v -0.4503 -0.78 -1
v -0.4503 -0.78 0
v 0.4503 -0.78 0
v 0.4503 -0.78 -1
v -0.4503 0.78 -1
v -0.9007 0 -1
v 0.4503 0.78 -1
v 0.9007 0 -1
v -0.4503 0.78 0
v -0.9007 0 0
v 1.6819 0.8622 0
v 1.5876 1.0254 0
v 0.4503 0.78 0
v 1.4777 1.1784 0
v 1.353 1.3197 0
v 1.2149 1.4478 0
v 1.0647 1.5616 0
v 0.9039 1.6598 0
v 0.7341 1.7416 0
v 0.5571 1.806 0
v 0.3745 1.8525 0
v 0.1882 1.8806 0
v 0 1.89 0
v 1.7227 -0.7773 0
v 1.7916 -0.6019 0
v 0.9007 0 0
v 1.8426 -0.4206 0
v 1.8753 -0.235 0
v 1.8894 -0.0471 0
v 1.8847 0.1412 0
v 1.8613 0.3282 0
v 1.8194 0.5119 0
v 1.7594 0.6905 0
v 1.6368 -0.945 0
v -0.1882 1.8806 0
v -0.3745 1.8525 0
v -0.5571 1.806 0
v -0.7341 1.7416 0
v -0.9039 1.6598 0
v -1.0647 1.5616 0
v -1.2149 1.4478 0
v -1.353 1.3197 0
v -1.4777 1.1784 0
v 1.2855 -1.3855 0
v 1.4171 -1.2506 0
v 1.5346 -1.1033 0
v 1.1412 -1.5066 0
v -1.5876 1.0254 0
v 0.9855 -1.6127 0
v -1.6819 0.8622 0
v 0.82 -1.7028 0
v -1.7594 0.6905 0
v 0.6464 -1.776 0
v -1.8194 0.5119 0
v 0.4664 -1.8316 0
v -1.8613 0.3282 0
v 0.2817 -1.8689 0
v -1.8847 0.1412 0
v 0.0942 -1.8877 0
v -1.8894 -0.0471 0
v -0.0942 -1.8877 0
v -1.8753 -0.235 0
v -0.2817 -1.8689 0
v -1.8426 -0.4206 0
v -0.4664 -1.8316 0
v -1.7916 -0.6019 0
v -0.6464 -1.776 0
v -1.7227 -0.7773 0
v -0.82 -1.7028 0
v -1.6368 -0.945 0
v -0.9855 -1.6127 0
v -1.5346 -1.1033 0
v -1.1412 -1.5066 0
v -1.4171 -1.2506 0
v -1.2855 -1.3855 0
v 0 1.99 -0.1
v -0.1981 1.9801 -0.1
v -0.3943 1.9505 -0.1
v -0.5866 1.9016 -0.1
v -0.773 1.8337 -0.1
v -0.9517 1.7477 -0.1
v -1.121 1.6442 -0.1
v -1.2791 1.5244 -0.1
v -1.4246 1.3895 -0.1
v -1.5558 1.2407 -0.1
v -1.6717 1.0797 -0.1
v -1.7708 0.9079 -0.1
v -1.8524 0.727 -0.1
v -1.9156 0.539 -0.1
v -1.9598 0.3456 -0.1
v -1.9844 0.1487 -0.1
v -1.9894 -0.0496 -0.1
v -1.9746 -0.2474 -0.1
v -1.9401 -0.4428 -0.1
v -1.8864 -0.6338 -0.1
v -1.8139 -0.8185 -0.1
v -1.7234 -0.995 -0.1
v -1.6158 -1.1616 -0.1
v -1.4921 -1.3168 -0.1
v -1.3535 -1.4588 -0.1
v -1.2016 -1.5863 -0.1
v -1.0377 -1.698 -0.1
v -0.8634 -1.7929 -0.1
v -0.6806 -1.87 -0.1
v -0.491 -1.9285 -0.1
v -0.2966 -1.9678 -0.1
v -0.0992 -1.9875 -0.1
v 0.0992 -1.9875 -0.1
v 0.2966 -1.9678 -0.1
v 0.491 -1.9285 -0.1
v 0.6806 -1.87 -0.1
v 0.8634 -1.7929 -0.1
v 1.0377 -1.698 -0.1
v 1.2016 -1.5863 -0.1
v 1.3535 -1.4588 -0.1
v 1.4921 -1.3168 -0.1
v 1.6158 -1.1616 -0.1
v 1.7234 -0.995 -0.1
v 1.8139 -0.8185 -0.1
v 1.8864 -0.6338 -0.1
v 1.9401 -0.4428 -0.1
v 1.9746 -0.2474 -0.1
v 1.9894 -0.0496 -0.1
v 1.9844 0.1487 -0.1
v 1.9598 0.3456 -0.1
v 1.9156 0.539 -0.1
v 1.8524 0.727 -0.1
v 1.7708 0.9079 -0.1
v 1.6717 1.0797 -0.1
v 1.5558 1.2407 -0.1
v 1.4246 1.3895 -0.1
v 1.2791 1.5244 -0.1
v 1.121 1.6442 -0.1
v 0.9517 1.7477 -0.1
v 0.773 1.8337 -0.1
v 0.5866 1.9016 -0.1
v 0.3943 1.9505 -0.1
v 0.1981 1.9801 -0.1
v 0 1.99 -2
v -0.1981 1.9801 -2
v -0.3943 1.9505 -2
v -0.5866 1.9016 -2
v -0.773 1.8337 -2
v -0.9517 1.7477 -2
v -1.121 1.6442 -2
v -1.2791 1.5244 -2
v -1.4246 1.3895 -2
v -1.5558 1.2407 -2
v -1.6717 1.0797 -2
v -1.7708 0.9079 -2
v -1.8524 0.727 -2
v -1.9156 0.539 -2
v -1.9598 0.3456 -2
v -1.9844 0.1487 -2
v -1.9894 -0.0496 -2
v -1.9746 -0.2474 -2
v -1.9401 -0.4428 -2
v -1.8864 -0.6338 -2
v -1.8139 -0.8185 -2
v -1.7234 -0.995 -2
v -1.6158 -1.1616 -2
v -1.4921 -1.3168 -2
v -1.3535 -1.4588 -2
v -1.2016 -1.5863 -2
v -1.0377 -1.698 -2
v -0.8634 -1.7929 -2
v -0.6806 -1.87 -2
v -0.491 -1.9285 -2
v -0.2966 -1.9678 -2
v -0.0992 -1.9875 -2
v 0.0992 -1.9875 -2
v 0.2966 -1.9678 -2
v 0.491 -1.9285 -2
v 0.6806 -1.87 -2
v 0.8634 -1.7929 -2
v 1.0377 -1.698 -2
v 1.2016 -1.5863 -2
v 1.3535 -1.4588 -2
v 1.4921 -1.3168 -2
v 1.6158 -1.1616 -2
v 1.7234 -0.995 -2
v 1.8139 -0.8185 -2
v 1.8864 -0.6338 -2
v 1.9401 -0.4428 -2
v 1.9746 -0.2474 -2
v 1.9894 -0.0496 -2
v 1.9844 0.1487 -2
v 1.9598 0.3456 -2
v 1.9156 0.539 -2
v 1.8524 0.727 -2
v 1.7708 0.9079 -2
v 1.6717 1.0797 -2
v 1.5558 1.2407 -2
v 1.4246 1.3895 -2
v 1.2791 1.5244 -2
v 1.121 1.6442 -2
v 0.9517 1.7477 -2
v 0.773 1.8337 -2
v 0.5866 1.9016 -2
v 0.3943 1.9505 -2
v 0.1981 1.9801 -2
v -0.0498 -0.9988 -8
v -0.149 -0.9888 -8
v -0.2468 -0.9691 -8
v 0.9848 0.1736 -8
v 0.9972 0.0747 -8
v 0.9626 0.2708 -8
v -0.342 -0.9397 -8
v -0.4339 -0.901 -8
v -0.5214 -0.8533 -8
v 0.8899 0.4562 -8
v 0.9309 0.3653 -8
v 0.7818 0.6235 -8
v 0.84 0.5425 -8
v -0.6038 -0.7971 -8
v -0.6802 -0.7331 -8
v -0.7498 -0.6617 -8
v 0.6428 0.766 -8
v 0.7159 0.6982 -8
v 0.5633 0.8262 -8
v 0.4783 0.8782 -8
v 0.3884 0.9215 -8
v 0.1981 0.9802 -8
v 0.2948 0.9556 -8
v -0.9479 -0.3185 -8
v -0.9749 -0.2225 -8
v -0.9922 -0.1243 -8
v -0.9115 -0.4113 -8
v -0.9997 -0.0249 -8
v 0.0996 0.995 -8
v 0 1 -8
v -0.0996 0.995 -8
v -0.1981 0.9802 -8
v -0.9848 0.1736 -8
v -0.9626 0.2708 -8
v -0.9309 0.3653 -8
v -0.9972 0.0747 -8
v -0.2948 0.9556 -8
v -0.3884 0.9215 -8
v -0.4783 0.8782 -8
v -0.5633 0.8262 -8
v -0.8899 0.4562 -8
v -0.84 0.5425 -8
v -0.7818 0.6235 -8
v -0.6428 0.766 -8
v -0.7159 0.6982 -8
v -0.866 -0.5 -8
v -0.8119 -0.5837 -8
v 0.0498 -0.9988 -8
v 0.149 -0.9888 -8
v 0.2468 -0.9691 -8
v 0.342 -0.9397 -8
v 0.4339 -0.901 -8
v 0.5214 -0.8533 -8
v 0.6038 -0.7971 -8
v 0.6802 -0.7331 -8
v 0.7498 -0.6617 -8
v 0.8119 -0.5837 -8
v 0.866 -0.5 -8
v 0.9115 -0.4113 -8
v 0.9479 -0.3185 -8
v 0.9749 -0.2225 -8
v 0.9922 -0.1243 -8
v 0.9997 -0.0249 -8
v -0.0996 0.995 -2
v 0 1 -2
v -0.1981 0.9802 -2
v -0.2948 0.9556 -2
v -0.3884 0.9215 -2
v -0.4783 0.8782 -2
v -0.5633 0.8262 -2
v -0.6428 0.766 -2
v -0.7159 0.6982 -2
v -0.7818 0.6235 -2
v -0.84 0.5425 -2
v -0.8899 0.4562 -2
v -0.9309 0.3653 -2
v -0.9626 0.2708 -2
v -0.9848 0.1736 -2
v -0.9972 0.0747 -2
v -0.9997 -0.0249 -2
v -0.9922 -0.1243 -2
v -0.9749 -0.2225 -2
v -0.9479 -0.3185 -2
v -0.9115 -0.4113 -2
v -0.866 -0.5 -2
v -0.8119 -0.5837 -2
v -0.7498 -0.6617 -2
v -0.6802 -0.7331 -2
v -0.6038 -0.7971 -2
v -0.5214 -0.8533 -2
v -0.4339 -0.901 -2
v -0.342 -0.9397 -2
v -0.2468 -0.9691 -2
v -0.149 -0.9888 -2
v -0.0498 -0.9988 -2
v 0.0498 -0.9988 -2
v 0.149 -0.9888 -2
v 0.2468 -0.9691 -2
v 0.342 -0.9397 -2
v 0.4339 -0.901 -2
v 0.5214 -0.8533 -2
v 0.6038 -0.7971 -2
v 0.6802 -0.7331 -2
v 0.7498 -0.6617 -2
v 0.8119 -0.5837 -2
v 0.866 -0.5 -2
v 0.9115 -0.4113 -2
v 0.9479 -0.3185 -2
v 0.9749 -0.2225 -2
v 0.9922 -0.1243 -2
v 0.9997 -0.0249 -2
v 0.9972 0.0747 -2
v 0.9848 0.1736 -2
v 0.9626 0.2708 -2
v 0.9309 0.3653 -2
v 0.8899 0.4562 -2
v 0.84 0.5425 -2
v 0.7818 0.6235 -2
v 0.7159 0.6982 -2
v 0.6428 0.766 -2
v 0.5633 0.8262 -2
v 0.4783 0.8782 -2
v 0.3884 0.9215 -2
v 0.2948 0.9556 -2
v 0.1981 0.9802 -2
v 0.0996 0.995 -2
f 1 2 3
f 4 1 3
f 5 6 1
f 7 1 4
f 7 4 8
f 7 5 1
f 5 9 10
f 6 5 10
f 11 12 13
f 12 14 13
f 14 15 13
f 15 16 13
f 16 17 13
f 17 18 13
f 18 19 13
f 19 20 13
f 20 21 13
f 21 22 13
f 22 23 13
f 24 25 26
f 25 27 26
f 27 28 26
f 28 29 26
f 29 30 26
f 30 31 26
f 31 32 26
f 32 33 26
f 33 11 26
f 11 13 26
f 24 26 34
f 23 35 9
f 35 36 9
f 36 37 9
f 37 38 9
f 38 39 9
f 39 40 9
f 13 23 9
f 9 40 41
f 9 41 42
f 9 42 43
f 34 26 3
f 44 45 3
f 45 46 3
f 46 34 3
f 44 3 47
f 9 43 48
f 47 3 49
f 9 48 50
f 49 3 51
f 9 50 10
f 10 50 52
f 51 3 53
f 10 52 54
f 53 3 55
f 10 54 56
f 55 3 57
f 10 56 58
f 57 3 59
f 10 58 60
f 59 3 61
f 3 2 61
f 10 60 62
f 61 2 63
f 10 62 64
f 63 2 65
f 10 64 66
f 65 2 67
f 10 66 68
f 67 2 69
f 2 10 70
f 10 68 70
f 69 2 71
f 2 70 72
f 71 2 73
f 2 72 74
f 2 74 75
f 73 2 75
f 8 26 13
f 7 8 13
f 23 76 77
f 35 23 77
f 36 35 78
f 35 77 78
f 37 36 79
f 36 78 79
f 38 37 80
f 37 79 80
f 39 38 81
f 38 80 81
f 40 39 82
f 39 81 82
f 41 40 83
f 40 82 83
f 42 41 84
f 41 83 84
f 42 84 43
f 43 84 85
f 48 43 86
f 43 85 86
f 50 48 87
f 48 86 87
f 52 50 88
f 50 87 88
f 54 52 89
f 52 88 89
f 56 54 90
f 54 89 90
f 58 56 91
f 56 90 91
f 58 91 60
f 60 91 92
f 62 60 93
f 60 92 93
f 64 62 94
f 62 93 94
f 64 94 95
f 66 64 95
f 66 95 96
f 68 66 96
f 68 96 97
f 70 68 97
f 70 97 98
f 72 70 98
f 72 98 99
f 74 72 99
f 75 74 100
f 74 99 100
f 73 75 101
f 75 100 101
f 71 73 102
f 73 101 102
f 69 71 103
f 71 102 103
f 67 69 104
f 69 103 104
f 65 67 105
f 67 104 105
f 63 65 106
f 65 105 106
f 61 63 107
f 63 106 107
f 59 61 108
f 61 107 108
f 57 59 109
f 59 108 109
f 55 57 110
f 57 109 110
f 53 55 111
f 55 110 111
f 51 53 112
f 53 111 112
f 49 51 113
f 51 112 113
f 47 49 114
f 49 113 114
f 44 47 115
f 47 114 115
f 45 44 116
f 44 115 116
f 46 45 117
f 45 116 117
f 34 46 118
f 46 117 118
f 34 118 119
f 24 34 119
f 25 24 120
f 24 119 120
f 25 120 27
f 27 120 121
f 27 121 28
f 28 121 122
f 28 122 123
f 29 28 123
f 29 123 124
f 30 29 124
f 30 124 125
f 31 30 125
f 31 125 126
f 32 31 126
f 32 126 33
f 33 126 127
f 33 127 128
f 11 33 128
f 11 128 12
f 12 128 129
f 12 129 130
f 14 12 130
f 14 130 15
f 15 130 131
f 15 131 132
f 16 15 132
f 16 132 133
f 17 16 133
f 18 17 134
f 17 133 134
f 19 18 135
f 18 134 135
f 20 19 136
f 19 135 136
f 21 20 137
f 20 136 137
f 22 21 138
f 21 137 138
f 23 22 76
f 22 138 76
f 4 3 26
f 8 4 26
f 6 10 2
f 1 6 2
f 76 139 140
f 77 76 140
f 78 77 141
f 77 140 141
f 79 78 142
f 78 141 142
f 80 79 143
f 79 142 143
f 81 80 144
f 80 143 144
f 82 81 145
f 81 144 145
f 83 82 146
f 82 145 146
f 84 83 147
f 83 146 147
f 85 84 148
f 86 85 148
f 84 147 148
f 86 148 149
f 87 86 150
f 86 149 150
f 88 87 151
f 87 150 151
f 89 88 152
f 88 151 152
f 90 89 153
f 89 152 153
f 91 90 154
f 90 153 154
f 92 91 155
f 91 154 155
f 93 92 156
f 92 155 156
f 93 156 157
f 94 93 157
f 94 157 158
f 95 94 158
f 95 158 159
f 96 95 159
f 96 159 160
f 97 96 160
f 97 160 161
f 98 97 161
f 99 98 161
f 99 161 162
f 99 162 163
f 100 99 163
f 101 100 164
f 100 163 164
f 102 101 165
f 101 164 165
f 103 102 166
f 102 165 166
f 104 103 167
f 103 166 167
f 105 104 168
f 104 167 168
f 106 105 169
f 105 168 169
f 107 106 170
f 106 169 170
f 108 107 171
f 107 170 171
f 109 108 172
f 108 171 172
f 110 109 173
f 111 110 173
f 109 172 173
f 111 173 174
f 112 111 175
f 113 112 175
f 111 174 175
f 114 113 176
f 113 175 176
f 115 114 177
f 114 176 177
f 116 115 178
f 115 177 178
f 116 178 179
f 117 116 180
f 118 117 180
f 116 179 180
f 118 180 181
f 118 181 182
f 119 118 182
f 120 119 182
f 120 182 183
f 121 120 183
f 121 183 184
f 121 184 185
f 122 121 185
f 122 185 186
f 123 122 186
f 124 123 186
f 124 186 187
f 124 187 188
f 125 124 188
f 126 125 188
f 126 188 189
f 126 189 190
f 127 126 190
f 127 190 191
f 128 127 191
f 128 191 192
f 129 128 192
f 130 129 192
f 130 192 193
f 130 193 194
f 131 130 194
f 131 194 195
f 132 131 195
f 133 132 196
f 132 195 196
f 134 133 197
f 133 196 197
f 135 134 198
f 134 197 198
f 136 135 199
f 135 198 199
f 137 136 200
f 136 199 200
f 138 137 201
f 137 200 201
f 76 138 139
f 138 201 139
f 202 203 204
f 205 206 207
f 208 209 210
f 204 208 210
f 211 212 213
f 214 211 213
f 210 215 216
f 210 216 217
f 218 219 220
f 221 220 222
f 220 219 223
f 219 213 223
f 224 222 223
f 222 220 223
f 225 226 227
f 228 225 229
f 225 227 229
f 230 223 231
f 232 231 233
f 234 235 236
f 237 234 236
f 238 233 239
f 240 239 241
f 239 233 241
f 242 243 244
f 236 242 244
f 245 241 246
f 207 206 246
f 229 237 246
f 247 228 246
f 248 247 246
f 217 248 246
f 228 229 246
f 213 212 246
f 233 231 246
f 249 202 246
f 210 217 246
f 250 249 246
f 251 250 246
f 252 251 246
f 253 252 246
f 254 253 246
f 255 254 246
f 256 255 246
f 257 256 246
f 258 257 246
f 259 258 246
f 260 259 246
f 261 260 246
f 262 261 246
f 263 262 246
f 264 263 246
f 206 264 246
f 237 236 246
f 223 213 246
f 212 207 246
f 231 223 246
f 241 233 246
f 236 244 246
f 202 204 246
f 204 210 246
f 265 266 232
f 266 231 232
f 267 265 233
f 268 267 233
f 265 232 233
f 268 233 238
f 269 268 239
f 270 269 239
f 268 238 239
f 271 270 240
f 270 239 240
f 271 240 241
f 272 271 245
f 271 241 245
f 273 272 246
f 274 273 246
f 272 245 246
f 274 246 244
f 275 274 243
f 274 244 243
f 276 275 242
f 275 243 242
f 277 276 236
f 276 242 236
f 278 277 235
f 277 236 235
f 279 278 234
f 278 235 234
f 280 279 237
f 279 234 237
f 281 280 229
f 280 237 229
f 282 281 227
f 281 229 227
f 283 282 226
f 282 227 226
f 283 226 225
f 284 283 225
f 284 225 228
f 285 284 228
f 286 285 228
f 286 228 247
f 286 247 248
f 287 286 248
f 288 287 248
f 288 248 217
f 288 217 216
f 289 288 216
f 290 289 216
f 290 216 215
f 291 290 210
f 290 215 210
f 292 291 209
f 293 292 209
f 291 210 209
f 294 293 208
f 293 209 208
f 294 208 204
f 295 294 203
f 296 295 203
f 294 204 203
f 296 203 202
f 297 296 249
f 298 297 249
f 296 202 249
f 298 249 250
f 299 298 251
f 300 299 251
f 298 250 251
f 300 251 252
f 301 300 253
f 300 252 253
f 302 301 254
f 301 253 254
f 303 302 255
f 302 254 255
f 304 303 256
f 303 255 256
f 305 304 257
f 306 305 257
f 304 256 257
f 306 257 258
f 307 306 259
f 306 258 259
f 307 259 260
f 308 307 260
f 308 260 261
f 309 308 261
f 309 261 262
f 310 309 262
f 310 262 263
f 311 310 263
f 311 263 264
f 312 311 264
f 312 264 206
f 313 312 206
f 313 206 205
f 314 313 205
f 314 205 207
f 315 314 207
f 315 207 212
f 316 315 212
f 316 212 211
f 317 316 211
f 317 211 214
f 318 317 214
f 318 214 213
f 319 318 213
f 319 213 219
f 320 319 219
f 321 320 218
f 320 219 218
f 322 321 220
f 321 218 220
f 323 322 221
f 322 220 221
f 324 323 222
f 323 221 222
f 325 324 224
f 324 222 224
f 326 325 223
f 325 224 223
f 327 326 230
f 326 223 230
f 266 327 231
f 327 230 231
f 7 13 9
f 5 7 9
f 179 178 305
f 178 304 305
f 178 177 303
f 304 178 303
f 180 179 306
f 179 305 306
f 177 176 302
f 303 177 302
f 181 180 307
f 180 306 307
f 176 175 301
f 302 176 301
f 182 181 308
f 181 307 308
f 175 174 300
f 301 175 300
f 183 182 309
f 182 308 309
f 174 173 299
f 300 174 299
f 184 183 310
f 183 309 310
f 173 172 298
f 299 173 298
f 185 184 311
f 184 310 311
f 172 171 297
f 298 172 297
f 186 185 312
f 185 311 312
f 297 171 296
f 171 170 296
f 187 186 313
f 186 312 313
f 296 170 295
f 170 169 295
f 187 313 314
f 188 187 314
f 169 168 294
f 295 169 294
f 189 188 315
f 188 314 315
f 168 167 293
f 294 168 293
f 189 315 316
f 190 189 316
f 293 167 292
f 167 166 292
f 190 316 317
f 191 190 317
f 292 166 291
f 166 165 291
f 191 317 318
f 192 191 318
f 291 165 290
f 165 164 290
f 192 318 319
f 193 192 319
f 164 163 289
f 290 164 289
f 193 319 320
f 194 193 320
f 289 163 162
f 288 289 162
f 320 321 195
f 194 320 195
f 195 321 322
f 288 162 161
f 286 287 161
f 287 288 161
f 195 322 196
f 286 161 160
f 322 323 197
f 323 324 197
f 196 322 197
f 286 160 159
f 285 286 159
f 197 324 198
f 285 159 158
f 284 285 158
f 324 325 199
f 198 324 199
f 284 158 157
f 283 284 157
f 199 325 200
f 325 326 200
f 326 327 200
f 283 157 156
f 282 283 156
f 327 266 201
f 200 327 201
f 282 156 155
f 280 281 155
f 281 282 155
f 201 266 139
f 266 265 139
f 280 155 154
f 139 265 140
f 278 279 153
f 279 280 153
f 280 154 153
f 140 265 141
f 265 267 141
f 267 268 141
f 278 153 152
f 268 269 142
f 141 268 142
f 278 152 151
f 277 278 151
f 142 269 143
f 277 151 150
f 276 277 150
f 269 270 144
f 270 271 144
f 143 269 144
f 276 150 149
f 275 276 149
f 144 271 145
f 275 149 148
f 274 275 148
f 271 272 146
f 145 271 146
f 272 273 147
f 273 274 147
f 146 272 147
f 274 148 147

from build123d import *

# Parameters (mm, degrees)
CUT_EXTRUDE_1_DEPTH = 1
CHAMFER_627_SIZE    = 0.1


with BuildPart() as part:
    # 草图1 → 旋转1 (revolve)
    with BuildSketch(Plane(origin=(0, 0, 0), x_dir=(0, 0, -1), z_dir=(1, 0, 0))):
        Polygon((0, 0), (0, 1.99), (2, 1.99), (2, 1), (8, 1), (8, 0), align=None)
    revolve(axis=Axis((0, 0, -8), (0, 0, 1)))

    # 草图2 → 切除-拉伸1 (cut)
    with BuildSketch(Plane.XY):
        Polygon((0.45033321, 0.78), (-0.45033321, 0.78), (-0.90066642, 0), (-0.45033321, -0.78), (0.45033321, -0.78), (0.90066642, 0), align=None)
    extrude(amount=-CUT_EXTRUDE_1_DEPTH, mode=Mode.SUBTRACT)

    # Chamfer 627
    chamfer_627_edges = [part.edges().sort_by_distance(p)[0] for p in [
        (0, -1.99, 0),
    ]]
    chamfer(chamfer_627_edges, length=CHAMFER_627_SIZE)


solid = part.part
